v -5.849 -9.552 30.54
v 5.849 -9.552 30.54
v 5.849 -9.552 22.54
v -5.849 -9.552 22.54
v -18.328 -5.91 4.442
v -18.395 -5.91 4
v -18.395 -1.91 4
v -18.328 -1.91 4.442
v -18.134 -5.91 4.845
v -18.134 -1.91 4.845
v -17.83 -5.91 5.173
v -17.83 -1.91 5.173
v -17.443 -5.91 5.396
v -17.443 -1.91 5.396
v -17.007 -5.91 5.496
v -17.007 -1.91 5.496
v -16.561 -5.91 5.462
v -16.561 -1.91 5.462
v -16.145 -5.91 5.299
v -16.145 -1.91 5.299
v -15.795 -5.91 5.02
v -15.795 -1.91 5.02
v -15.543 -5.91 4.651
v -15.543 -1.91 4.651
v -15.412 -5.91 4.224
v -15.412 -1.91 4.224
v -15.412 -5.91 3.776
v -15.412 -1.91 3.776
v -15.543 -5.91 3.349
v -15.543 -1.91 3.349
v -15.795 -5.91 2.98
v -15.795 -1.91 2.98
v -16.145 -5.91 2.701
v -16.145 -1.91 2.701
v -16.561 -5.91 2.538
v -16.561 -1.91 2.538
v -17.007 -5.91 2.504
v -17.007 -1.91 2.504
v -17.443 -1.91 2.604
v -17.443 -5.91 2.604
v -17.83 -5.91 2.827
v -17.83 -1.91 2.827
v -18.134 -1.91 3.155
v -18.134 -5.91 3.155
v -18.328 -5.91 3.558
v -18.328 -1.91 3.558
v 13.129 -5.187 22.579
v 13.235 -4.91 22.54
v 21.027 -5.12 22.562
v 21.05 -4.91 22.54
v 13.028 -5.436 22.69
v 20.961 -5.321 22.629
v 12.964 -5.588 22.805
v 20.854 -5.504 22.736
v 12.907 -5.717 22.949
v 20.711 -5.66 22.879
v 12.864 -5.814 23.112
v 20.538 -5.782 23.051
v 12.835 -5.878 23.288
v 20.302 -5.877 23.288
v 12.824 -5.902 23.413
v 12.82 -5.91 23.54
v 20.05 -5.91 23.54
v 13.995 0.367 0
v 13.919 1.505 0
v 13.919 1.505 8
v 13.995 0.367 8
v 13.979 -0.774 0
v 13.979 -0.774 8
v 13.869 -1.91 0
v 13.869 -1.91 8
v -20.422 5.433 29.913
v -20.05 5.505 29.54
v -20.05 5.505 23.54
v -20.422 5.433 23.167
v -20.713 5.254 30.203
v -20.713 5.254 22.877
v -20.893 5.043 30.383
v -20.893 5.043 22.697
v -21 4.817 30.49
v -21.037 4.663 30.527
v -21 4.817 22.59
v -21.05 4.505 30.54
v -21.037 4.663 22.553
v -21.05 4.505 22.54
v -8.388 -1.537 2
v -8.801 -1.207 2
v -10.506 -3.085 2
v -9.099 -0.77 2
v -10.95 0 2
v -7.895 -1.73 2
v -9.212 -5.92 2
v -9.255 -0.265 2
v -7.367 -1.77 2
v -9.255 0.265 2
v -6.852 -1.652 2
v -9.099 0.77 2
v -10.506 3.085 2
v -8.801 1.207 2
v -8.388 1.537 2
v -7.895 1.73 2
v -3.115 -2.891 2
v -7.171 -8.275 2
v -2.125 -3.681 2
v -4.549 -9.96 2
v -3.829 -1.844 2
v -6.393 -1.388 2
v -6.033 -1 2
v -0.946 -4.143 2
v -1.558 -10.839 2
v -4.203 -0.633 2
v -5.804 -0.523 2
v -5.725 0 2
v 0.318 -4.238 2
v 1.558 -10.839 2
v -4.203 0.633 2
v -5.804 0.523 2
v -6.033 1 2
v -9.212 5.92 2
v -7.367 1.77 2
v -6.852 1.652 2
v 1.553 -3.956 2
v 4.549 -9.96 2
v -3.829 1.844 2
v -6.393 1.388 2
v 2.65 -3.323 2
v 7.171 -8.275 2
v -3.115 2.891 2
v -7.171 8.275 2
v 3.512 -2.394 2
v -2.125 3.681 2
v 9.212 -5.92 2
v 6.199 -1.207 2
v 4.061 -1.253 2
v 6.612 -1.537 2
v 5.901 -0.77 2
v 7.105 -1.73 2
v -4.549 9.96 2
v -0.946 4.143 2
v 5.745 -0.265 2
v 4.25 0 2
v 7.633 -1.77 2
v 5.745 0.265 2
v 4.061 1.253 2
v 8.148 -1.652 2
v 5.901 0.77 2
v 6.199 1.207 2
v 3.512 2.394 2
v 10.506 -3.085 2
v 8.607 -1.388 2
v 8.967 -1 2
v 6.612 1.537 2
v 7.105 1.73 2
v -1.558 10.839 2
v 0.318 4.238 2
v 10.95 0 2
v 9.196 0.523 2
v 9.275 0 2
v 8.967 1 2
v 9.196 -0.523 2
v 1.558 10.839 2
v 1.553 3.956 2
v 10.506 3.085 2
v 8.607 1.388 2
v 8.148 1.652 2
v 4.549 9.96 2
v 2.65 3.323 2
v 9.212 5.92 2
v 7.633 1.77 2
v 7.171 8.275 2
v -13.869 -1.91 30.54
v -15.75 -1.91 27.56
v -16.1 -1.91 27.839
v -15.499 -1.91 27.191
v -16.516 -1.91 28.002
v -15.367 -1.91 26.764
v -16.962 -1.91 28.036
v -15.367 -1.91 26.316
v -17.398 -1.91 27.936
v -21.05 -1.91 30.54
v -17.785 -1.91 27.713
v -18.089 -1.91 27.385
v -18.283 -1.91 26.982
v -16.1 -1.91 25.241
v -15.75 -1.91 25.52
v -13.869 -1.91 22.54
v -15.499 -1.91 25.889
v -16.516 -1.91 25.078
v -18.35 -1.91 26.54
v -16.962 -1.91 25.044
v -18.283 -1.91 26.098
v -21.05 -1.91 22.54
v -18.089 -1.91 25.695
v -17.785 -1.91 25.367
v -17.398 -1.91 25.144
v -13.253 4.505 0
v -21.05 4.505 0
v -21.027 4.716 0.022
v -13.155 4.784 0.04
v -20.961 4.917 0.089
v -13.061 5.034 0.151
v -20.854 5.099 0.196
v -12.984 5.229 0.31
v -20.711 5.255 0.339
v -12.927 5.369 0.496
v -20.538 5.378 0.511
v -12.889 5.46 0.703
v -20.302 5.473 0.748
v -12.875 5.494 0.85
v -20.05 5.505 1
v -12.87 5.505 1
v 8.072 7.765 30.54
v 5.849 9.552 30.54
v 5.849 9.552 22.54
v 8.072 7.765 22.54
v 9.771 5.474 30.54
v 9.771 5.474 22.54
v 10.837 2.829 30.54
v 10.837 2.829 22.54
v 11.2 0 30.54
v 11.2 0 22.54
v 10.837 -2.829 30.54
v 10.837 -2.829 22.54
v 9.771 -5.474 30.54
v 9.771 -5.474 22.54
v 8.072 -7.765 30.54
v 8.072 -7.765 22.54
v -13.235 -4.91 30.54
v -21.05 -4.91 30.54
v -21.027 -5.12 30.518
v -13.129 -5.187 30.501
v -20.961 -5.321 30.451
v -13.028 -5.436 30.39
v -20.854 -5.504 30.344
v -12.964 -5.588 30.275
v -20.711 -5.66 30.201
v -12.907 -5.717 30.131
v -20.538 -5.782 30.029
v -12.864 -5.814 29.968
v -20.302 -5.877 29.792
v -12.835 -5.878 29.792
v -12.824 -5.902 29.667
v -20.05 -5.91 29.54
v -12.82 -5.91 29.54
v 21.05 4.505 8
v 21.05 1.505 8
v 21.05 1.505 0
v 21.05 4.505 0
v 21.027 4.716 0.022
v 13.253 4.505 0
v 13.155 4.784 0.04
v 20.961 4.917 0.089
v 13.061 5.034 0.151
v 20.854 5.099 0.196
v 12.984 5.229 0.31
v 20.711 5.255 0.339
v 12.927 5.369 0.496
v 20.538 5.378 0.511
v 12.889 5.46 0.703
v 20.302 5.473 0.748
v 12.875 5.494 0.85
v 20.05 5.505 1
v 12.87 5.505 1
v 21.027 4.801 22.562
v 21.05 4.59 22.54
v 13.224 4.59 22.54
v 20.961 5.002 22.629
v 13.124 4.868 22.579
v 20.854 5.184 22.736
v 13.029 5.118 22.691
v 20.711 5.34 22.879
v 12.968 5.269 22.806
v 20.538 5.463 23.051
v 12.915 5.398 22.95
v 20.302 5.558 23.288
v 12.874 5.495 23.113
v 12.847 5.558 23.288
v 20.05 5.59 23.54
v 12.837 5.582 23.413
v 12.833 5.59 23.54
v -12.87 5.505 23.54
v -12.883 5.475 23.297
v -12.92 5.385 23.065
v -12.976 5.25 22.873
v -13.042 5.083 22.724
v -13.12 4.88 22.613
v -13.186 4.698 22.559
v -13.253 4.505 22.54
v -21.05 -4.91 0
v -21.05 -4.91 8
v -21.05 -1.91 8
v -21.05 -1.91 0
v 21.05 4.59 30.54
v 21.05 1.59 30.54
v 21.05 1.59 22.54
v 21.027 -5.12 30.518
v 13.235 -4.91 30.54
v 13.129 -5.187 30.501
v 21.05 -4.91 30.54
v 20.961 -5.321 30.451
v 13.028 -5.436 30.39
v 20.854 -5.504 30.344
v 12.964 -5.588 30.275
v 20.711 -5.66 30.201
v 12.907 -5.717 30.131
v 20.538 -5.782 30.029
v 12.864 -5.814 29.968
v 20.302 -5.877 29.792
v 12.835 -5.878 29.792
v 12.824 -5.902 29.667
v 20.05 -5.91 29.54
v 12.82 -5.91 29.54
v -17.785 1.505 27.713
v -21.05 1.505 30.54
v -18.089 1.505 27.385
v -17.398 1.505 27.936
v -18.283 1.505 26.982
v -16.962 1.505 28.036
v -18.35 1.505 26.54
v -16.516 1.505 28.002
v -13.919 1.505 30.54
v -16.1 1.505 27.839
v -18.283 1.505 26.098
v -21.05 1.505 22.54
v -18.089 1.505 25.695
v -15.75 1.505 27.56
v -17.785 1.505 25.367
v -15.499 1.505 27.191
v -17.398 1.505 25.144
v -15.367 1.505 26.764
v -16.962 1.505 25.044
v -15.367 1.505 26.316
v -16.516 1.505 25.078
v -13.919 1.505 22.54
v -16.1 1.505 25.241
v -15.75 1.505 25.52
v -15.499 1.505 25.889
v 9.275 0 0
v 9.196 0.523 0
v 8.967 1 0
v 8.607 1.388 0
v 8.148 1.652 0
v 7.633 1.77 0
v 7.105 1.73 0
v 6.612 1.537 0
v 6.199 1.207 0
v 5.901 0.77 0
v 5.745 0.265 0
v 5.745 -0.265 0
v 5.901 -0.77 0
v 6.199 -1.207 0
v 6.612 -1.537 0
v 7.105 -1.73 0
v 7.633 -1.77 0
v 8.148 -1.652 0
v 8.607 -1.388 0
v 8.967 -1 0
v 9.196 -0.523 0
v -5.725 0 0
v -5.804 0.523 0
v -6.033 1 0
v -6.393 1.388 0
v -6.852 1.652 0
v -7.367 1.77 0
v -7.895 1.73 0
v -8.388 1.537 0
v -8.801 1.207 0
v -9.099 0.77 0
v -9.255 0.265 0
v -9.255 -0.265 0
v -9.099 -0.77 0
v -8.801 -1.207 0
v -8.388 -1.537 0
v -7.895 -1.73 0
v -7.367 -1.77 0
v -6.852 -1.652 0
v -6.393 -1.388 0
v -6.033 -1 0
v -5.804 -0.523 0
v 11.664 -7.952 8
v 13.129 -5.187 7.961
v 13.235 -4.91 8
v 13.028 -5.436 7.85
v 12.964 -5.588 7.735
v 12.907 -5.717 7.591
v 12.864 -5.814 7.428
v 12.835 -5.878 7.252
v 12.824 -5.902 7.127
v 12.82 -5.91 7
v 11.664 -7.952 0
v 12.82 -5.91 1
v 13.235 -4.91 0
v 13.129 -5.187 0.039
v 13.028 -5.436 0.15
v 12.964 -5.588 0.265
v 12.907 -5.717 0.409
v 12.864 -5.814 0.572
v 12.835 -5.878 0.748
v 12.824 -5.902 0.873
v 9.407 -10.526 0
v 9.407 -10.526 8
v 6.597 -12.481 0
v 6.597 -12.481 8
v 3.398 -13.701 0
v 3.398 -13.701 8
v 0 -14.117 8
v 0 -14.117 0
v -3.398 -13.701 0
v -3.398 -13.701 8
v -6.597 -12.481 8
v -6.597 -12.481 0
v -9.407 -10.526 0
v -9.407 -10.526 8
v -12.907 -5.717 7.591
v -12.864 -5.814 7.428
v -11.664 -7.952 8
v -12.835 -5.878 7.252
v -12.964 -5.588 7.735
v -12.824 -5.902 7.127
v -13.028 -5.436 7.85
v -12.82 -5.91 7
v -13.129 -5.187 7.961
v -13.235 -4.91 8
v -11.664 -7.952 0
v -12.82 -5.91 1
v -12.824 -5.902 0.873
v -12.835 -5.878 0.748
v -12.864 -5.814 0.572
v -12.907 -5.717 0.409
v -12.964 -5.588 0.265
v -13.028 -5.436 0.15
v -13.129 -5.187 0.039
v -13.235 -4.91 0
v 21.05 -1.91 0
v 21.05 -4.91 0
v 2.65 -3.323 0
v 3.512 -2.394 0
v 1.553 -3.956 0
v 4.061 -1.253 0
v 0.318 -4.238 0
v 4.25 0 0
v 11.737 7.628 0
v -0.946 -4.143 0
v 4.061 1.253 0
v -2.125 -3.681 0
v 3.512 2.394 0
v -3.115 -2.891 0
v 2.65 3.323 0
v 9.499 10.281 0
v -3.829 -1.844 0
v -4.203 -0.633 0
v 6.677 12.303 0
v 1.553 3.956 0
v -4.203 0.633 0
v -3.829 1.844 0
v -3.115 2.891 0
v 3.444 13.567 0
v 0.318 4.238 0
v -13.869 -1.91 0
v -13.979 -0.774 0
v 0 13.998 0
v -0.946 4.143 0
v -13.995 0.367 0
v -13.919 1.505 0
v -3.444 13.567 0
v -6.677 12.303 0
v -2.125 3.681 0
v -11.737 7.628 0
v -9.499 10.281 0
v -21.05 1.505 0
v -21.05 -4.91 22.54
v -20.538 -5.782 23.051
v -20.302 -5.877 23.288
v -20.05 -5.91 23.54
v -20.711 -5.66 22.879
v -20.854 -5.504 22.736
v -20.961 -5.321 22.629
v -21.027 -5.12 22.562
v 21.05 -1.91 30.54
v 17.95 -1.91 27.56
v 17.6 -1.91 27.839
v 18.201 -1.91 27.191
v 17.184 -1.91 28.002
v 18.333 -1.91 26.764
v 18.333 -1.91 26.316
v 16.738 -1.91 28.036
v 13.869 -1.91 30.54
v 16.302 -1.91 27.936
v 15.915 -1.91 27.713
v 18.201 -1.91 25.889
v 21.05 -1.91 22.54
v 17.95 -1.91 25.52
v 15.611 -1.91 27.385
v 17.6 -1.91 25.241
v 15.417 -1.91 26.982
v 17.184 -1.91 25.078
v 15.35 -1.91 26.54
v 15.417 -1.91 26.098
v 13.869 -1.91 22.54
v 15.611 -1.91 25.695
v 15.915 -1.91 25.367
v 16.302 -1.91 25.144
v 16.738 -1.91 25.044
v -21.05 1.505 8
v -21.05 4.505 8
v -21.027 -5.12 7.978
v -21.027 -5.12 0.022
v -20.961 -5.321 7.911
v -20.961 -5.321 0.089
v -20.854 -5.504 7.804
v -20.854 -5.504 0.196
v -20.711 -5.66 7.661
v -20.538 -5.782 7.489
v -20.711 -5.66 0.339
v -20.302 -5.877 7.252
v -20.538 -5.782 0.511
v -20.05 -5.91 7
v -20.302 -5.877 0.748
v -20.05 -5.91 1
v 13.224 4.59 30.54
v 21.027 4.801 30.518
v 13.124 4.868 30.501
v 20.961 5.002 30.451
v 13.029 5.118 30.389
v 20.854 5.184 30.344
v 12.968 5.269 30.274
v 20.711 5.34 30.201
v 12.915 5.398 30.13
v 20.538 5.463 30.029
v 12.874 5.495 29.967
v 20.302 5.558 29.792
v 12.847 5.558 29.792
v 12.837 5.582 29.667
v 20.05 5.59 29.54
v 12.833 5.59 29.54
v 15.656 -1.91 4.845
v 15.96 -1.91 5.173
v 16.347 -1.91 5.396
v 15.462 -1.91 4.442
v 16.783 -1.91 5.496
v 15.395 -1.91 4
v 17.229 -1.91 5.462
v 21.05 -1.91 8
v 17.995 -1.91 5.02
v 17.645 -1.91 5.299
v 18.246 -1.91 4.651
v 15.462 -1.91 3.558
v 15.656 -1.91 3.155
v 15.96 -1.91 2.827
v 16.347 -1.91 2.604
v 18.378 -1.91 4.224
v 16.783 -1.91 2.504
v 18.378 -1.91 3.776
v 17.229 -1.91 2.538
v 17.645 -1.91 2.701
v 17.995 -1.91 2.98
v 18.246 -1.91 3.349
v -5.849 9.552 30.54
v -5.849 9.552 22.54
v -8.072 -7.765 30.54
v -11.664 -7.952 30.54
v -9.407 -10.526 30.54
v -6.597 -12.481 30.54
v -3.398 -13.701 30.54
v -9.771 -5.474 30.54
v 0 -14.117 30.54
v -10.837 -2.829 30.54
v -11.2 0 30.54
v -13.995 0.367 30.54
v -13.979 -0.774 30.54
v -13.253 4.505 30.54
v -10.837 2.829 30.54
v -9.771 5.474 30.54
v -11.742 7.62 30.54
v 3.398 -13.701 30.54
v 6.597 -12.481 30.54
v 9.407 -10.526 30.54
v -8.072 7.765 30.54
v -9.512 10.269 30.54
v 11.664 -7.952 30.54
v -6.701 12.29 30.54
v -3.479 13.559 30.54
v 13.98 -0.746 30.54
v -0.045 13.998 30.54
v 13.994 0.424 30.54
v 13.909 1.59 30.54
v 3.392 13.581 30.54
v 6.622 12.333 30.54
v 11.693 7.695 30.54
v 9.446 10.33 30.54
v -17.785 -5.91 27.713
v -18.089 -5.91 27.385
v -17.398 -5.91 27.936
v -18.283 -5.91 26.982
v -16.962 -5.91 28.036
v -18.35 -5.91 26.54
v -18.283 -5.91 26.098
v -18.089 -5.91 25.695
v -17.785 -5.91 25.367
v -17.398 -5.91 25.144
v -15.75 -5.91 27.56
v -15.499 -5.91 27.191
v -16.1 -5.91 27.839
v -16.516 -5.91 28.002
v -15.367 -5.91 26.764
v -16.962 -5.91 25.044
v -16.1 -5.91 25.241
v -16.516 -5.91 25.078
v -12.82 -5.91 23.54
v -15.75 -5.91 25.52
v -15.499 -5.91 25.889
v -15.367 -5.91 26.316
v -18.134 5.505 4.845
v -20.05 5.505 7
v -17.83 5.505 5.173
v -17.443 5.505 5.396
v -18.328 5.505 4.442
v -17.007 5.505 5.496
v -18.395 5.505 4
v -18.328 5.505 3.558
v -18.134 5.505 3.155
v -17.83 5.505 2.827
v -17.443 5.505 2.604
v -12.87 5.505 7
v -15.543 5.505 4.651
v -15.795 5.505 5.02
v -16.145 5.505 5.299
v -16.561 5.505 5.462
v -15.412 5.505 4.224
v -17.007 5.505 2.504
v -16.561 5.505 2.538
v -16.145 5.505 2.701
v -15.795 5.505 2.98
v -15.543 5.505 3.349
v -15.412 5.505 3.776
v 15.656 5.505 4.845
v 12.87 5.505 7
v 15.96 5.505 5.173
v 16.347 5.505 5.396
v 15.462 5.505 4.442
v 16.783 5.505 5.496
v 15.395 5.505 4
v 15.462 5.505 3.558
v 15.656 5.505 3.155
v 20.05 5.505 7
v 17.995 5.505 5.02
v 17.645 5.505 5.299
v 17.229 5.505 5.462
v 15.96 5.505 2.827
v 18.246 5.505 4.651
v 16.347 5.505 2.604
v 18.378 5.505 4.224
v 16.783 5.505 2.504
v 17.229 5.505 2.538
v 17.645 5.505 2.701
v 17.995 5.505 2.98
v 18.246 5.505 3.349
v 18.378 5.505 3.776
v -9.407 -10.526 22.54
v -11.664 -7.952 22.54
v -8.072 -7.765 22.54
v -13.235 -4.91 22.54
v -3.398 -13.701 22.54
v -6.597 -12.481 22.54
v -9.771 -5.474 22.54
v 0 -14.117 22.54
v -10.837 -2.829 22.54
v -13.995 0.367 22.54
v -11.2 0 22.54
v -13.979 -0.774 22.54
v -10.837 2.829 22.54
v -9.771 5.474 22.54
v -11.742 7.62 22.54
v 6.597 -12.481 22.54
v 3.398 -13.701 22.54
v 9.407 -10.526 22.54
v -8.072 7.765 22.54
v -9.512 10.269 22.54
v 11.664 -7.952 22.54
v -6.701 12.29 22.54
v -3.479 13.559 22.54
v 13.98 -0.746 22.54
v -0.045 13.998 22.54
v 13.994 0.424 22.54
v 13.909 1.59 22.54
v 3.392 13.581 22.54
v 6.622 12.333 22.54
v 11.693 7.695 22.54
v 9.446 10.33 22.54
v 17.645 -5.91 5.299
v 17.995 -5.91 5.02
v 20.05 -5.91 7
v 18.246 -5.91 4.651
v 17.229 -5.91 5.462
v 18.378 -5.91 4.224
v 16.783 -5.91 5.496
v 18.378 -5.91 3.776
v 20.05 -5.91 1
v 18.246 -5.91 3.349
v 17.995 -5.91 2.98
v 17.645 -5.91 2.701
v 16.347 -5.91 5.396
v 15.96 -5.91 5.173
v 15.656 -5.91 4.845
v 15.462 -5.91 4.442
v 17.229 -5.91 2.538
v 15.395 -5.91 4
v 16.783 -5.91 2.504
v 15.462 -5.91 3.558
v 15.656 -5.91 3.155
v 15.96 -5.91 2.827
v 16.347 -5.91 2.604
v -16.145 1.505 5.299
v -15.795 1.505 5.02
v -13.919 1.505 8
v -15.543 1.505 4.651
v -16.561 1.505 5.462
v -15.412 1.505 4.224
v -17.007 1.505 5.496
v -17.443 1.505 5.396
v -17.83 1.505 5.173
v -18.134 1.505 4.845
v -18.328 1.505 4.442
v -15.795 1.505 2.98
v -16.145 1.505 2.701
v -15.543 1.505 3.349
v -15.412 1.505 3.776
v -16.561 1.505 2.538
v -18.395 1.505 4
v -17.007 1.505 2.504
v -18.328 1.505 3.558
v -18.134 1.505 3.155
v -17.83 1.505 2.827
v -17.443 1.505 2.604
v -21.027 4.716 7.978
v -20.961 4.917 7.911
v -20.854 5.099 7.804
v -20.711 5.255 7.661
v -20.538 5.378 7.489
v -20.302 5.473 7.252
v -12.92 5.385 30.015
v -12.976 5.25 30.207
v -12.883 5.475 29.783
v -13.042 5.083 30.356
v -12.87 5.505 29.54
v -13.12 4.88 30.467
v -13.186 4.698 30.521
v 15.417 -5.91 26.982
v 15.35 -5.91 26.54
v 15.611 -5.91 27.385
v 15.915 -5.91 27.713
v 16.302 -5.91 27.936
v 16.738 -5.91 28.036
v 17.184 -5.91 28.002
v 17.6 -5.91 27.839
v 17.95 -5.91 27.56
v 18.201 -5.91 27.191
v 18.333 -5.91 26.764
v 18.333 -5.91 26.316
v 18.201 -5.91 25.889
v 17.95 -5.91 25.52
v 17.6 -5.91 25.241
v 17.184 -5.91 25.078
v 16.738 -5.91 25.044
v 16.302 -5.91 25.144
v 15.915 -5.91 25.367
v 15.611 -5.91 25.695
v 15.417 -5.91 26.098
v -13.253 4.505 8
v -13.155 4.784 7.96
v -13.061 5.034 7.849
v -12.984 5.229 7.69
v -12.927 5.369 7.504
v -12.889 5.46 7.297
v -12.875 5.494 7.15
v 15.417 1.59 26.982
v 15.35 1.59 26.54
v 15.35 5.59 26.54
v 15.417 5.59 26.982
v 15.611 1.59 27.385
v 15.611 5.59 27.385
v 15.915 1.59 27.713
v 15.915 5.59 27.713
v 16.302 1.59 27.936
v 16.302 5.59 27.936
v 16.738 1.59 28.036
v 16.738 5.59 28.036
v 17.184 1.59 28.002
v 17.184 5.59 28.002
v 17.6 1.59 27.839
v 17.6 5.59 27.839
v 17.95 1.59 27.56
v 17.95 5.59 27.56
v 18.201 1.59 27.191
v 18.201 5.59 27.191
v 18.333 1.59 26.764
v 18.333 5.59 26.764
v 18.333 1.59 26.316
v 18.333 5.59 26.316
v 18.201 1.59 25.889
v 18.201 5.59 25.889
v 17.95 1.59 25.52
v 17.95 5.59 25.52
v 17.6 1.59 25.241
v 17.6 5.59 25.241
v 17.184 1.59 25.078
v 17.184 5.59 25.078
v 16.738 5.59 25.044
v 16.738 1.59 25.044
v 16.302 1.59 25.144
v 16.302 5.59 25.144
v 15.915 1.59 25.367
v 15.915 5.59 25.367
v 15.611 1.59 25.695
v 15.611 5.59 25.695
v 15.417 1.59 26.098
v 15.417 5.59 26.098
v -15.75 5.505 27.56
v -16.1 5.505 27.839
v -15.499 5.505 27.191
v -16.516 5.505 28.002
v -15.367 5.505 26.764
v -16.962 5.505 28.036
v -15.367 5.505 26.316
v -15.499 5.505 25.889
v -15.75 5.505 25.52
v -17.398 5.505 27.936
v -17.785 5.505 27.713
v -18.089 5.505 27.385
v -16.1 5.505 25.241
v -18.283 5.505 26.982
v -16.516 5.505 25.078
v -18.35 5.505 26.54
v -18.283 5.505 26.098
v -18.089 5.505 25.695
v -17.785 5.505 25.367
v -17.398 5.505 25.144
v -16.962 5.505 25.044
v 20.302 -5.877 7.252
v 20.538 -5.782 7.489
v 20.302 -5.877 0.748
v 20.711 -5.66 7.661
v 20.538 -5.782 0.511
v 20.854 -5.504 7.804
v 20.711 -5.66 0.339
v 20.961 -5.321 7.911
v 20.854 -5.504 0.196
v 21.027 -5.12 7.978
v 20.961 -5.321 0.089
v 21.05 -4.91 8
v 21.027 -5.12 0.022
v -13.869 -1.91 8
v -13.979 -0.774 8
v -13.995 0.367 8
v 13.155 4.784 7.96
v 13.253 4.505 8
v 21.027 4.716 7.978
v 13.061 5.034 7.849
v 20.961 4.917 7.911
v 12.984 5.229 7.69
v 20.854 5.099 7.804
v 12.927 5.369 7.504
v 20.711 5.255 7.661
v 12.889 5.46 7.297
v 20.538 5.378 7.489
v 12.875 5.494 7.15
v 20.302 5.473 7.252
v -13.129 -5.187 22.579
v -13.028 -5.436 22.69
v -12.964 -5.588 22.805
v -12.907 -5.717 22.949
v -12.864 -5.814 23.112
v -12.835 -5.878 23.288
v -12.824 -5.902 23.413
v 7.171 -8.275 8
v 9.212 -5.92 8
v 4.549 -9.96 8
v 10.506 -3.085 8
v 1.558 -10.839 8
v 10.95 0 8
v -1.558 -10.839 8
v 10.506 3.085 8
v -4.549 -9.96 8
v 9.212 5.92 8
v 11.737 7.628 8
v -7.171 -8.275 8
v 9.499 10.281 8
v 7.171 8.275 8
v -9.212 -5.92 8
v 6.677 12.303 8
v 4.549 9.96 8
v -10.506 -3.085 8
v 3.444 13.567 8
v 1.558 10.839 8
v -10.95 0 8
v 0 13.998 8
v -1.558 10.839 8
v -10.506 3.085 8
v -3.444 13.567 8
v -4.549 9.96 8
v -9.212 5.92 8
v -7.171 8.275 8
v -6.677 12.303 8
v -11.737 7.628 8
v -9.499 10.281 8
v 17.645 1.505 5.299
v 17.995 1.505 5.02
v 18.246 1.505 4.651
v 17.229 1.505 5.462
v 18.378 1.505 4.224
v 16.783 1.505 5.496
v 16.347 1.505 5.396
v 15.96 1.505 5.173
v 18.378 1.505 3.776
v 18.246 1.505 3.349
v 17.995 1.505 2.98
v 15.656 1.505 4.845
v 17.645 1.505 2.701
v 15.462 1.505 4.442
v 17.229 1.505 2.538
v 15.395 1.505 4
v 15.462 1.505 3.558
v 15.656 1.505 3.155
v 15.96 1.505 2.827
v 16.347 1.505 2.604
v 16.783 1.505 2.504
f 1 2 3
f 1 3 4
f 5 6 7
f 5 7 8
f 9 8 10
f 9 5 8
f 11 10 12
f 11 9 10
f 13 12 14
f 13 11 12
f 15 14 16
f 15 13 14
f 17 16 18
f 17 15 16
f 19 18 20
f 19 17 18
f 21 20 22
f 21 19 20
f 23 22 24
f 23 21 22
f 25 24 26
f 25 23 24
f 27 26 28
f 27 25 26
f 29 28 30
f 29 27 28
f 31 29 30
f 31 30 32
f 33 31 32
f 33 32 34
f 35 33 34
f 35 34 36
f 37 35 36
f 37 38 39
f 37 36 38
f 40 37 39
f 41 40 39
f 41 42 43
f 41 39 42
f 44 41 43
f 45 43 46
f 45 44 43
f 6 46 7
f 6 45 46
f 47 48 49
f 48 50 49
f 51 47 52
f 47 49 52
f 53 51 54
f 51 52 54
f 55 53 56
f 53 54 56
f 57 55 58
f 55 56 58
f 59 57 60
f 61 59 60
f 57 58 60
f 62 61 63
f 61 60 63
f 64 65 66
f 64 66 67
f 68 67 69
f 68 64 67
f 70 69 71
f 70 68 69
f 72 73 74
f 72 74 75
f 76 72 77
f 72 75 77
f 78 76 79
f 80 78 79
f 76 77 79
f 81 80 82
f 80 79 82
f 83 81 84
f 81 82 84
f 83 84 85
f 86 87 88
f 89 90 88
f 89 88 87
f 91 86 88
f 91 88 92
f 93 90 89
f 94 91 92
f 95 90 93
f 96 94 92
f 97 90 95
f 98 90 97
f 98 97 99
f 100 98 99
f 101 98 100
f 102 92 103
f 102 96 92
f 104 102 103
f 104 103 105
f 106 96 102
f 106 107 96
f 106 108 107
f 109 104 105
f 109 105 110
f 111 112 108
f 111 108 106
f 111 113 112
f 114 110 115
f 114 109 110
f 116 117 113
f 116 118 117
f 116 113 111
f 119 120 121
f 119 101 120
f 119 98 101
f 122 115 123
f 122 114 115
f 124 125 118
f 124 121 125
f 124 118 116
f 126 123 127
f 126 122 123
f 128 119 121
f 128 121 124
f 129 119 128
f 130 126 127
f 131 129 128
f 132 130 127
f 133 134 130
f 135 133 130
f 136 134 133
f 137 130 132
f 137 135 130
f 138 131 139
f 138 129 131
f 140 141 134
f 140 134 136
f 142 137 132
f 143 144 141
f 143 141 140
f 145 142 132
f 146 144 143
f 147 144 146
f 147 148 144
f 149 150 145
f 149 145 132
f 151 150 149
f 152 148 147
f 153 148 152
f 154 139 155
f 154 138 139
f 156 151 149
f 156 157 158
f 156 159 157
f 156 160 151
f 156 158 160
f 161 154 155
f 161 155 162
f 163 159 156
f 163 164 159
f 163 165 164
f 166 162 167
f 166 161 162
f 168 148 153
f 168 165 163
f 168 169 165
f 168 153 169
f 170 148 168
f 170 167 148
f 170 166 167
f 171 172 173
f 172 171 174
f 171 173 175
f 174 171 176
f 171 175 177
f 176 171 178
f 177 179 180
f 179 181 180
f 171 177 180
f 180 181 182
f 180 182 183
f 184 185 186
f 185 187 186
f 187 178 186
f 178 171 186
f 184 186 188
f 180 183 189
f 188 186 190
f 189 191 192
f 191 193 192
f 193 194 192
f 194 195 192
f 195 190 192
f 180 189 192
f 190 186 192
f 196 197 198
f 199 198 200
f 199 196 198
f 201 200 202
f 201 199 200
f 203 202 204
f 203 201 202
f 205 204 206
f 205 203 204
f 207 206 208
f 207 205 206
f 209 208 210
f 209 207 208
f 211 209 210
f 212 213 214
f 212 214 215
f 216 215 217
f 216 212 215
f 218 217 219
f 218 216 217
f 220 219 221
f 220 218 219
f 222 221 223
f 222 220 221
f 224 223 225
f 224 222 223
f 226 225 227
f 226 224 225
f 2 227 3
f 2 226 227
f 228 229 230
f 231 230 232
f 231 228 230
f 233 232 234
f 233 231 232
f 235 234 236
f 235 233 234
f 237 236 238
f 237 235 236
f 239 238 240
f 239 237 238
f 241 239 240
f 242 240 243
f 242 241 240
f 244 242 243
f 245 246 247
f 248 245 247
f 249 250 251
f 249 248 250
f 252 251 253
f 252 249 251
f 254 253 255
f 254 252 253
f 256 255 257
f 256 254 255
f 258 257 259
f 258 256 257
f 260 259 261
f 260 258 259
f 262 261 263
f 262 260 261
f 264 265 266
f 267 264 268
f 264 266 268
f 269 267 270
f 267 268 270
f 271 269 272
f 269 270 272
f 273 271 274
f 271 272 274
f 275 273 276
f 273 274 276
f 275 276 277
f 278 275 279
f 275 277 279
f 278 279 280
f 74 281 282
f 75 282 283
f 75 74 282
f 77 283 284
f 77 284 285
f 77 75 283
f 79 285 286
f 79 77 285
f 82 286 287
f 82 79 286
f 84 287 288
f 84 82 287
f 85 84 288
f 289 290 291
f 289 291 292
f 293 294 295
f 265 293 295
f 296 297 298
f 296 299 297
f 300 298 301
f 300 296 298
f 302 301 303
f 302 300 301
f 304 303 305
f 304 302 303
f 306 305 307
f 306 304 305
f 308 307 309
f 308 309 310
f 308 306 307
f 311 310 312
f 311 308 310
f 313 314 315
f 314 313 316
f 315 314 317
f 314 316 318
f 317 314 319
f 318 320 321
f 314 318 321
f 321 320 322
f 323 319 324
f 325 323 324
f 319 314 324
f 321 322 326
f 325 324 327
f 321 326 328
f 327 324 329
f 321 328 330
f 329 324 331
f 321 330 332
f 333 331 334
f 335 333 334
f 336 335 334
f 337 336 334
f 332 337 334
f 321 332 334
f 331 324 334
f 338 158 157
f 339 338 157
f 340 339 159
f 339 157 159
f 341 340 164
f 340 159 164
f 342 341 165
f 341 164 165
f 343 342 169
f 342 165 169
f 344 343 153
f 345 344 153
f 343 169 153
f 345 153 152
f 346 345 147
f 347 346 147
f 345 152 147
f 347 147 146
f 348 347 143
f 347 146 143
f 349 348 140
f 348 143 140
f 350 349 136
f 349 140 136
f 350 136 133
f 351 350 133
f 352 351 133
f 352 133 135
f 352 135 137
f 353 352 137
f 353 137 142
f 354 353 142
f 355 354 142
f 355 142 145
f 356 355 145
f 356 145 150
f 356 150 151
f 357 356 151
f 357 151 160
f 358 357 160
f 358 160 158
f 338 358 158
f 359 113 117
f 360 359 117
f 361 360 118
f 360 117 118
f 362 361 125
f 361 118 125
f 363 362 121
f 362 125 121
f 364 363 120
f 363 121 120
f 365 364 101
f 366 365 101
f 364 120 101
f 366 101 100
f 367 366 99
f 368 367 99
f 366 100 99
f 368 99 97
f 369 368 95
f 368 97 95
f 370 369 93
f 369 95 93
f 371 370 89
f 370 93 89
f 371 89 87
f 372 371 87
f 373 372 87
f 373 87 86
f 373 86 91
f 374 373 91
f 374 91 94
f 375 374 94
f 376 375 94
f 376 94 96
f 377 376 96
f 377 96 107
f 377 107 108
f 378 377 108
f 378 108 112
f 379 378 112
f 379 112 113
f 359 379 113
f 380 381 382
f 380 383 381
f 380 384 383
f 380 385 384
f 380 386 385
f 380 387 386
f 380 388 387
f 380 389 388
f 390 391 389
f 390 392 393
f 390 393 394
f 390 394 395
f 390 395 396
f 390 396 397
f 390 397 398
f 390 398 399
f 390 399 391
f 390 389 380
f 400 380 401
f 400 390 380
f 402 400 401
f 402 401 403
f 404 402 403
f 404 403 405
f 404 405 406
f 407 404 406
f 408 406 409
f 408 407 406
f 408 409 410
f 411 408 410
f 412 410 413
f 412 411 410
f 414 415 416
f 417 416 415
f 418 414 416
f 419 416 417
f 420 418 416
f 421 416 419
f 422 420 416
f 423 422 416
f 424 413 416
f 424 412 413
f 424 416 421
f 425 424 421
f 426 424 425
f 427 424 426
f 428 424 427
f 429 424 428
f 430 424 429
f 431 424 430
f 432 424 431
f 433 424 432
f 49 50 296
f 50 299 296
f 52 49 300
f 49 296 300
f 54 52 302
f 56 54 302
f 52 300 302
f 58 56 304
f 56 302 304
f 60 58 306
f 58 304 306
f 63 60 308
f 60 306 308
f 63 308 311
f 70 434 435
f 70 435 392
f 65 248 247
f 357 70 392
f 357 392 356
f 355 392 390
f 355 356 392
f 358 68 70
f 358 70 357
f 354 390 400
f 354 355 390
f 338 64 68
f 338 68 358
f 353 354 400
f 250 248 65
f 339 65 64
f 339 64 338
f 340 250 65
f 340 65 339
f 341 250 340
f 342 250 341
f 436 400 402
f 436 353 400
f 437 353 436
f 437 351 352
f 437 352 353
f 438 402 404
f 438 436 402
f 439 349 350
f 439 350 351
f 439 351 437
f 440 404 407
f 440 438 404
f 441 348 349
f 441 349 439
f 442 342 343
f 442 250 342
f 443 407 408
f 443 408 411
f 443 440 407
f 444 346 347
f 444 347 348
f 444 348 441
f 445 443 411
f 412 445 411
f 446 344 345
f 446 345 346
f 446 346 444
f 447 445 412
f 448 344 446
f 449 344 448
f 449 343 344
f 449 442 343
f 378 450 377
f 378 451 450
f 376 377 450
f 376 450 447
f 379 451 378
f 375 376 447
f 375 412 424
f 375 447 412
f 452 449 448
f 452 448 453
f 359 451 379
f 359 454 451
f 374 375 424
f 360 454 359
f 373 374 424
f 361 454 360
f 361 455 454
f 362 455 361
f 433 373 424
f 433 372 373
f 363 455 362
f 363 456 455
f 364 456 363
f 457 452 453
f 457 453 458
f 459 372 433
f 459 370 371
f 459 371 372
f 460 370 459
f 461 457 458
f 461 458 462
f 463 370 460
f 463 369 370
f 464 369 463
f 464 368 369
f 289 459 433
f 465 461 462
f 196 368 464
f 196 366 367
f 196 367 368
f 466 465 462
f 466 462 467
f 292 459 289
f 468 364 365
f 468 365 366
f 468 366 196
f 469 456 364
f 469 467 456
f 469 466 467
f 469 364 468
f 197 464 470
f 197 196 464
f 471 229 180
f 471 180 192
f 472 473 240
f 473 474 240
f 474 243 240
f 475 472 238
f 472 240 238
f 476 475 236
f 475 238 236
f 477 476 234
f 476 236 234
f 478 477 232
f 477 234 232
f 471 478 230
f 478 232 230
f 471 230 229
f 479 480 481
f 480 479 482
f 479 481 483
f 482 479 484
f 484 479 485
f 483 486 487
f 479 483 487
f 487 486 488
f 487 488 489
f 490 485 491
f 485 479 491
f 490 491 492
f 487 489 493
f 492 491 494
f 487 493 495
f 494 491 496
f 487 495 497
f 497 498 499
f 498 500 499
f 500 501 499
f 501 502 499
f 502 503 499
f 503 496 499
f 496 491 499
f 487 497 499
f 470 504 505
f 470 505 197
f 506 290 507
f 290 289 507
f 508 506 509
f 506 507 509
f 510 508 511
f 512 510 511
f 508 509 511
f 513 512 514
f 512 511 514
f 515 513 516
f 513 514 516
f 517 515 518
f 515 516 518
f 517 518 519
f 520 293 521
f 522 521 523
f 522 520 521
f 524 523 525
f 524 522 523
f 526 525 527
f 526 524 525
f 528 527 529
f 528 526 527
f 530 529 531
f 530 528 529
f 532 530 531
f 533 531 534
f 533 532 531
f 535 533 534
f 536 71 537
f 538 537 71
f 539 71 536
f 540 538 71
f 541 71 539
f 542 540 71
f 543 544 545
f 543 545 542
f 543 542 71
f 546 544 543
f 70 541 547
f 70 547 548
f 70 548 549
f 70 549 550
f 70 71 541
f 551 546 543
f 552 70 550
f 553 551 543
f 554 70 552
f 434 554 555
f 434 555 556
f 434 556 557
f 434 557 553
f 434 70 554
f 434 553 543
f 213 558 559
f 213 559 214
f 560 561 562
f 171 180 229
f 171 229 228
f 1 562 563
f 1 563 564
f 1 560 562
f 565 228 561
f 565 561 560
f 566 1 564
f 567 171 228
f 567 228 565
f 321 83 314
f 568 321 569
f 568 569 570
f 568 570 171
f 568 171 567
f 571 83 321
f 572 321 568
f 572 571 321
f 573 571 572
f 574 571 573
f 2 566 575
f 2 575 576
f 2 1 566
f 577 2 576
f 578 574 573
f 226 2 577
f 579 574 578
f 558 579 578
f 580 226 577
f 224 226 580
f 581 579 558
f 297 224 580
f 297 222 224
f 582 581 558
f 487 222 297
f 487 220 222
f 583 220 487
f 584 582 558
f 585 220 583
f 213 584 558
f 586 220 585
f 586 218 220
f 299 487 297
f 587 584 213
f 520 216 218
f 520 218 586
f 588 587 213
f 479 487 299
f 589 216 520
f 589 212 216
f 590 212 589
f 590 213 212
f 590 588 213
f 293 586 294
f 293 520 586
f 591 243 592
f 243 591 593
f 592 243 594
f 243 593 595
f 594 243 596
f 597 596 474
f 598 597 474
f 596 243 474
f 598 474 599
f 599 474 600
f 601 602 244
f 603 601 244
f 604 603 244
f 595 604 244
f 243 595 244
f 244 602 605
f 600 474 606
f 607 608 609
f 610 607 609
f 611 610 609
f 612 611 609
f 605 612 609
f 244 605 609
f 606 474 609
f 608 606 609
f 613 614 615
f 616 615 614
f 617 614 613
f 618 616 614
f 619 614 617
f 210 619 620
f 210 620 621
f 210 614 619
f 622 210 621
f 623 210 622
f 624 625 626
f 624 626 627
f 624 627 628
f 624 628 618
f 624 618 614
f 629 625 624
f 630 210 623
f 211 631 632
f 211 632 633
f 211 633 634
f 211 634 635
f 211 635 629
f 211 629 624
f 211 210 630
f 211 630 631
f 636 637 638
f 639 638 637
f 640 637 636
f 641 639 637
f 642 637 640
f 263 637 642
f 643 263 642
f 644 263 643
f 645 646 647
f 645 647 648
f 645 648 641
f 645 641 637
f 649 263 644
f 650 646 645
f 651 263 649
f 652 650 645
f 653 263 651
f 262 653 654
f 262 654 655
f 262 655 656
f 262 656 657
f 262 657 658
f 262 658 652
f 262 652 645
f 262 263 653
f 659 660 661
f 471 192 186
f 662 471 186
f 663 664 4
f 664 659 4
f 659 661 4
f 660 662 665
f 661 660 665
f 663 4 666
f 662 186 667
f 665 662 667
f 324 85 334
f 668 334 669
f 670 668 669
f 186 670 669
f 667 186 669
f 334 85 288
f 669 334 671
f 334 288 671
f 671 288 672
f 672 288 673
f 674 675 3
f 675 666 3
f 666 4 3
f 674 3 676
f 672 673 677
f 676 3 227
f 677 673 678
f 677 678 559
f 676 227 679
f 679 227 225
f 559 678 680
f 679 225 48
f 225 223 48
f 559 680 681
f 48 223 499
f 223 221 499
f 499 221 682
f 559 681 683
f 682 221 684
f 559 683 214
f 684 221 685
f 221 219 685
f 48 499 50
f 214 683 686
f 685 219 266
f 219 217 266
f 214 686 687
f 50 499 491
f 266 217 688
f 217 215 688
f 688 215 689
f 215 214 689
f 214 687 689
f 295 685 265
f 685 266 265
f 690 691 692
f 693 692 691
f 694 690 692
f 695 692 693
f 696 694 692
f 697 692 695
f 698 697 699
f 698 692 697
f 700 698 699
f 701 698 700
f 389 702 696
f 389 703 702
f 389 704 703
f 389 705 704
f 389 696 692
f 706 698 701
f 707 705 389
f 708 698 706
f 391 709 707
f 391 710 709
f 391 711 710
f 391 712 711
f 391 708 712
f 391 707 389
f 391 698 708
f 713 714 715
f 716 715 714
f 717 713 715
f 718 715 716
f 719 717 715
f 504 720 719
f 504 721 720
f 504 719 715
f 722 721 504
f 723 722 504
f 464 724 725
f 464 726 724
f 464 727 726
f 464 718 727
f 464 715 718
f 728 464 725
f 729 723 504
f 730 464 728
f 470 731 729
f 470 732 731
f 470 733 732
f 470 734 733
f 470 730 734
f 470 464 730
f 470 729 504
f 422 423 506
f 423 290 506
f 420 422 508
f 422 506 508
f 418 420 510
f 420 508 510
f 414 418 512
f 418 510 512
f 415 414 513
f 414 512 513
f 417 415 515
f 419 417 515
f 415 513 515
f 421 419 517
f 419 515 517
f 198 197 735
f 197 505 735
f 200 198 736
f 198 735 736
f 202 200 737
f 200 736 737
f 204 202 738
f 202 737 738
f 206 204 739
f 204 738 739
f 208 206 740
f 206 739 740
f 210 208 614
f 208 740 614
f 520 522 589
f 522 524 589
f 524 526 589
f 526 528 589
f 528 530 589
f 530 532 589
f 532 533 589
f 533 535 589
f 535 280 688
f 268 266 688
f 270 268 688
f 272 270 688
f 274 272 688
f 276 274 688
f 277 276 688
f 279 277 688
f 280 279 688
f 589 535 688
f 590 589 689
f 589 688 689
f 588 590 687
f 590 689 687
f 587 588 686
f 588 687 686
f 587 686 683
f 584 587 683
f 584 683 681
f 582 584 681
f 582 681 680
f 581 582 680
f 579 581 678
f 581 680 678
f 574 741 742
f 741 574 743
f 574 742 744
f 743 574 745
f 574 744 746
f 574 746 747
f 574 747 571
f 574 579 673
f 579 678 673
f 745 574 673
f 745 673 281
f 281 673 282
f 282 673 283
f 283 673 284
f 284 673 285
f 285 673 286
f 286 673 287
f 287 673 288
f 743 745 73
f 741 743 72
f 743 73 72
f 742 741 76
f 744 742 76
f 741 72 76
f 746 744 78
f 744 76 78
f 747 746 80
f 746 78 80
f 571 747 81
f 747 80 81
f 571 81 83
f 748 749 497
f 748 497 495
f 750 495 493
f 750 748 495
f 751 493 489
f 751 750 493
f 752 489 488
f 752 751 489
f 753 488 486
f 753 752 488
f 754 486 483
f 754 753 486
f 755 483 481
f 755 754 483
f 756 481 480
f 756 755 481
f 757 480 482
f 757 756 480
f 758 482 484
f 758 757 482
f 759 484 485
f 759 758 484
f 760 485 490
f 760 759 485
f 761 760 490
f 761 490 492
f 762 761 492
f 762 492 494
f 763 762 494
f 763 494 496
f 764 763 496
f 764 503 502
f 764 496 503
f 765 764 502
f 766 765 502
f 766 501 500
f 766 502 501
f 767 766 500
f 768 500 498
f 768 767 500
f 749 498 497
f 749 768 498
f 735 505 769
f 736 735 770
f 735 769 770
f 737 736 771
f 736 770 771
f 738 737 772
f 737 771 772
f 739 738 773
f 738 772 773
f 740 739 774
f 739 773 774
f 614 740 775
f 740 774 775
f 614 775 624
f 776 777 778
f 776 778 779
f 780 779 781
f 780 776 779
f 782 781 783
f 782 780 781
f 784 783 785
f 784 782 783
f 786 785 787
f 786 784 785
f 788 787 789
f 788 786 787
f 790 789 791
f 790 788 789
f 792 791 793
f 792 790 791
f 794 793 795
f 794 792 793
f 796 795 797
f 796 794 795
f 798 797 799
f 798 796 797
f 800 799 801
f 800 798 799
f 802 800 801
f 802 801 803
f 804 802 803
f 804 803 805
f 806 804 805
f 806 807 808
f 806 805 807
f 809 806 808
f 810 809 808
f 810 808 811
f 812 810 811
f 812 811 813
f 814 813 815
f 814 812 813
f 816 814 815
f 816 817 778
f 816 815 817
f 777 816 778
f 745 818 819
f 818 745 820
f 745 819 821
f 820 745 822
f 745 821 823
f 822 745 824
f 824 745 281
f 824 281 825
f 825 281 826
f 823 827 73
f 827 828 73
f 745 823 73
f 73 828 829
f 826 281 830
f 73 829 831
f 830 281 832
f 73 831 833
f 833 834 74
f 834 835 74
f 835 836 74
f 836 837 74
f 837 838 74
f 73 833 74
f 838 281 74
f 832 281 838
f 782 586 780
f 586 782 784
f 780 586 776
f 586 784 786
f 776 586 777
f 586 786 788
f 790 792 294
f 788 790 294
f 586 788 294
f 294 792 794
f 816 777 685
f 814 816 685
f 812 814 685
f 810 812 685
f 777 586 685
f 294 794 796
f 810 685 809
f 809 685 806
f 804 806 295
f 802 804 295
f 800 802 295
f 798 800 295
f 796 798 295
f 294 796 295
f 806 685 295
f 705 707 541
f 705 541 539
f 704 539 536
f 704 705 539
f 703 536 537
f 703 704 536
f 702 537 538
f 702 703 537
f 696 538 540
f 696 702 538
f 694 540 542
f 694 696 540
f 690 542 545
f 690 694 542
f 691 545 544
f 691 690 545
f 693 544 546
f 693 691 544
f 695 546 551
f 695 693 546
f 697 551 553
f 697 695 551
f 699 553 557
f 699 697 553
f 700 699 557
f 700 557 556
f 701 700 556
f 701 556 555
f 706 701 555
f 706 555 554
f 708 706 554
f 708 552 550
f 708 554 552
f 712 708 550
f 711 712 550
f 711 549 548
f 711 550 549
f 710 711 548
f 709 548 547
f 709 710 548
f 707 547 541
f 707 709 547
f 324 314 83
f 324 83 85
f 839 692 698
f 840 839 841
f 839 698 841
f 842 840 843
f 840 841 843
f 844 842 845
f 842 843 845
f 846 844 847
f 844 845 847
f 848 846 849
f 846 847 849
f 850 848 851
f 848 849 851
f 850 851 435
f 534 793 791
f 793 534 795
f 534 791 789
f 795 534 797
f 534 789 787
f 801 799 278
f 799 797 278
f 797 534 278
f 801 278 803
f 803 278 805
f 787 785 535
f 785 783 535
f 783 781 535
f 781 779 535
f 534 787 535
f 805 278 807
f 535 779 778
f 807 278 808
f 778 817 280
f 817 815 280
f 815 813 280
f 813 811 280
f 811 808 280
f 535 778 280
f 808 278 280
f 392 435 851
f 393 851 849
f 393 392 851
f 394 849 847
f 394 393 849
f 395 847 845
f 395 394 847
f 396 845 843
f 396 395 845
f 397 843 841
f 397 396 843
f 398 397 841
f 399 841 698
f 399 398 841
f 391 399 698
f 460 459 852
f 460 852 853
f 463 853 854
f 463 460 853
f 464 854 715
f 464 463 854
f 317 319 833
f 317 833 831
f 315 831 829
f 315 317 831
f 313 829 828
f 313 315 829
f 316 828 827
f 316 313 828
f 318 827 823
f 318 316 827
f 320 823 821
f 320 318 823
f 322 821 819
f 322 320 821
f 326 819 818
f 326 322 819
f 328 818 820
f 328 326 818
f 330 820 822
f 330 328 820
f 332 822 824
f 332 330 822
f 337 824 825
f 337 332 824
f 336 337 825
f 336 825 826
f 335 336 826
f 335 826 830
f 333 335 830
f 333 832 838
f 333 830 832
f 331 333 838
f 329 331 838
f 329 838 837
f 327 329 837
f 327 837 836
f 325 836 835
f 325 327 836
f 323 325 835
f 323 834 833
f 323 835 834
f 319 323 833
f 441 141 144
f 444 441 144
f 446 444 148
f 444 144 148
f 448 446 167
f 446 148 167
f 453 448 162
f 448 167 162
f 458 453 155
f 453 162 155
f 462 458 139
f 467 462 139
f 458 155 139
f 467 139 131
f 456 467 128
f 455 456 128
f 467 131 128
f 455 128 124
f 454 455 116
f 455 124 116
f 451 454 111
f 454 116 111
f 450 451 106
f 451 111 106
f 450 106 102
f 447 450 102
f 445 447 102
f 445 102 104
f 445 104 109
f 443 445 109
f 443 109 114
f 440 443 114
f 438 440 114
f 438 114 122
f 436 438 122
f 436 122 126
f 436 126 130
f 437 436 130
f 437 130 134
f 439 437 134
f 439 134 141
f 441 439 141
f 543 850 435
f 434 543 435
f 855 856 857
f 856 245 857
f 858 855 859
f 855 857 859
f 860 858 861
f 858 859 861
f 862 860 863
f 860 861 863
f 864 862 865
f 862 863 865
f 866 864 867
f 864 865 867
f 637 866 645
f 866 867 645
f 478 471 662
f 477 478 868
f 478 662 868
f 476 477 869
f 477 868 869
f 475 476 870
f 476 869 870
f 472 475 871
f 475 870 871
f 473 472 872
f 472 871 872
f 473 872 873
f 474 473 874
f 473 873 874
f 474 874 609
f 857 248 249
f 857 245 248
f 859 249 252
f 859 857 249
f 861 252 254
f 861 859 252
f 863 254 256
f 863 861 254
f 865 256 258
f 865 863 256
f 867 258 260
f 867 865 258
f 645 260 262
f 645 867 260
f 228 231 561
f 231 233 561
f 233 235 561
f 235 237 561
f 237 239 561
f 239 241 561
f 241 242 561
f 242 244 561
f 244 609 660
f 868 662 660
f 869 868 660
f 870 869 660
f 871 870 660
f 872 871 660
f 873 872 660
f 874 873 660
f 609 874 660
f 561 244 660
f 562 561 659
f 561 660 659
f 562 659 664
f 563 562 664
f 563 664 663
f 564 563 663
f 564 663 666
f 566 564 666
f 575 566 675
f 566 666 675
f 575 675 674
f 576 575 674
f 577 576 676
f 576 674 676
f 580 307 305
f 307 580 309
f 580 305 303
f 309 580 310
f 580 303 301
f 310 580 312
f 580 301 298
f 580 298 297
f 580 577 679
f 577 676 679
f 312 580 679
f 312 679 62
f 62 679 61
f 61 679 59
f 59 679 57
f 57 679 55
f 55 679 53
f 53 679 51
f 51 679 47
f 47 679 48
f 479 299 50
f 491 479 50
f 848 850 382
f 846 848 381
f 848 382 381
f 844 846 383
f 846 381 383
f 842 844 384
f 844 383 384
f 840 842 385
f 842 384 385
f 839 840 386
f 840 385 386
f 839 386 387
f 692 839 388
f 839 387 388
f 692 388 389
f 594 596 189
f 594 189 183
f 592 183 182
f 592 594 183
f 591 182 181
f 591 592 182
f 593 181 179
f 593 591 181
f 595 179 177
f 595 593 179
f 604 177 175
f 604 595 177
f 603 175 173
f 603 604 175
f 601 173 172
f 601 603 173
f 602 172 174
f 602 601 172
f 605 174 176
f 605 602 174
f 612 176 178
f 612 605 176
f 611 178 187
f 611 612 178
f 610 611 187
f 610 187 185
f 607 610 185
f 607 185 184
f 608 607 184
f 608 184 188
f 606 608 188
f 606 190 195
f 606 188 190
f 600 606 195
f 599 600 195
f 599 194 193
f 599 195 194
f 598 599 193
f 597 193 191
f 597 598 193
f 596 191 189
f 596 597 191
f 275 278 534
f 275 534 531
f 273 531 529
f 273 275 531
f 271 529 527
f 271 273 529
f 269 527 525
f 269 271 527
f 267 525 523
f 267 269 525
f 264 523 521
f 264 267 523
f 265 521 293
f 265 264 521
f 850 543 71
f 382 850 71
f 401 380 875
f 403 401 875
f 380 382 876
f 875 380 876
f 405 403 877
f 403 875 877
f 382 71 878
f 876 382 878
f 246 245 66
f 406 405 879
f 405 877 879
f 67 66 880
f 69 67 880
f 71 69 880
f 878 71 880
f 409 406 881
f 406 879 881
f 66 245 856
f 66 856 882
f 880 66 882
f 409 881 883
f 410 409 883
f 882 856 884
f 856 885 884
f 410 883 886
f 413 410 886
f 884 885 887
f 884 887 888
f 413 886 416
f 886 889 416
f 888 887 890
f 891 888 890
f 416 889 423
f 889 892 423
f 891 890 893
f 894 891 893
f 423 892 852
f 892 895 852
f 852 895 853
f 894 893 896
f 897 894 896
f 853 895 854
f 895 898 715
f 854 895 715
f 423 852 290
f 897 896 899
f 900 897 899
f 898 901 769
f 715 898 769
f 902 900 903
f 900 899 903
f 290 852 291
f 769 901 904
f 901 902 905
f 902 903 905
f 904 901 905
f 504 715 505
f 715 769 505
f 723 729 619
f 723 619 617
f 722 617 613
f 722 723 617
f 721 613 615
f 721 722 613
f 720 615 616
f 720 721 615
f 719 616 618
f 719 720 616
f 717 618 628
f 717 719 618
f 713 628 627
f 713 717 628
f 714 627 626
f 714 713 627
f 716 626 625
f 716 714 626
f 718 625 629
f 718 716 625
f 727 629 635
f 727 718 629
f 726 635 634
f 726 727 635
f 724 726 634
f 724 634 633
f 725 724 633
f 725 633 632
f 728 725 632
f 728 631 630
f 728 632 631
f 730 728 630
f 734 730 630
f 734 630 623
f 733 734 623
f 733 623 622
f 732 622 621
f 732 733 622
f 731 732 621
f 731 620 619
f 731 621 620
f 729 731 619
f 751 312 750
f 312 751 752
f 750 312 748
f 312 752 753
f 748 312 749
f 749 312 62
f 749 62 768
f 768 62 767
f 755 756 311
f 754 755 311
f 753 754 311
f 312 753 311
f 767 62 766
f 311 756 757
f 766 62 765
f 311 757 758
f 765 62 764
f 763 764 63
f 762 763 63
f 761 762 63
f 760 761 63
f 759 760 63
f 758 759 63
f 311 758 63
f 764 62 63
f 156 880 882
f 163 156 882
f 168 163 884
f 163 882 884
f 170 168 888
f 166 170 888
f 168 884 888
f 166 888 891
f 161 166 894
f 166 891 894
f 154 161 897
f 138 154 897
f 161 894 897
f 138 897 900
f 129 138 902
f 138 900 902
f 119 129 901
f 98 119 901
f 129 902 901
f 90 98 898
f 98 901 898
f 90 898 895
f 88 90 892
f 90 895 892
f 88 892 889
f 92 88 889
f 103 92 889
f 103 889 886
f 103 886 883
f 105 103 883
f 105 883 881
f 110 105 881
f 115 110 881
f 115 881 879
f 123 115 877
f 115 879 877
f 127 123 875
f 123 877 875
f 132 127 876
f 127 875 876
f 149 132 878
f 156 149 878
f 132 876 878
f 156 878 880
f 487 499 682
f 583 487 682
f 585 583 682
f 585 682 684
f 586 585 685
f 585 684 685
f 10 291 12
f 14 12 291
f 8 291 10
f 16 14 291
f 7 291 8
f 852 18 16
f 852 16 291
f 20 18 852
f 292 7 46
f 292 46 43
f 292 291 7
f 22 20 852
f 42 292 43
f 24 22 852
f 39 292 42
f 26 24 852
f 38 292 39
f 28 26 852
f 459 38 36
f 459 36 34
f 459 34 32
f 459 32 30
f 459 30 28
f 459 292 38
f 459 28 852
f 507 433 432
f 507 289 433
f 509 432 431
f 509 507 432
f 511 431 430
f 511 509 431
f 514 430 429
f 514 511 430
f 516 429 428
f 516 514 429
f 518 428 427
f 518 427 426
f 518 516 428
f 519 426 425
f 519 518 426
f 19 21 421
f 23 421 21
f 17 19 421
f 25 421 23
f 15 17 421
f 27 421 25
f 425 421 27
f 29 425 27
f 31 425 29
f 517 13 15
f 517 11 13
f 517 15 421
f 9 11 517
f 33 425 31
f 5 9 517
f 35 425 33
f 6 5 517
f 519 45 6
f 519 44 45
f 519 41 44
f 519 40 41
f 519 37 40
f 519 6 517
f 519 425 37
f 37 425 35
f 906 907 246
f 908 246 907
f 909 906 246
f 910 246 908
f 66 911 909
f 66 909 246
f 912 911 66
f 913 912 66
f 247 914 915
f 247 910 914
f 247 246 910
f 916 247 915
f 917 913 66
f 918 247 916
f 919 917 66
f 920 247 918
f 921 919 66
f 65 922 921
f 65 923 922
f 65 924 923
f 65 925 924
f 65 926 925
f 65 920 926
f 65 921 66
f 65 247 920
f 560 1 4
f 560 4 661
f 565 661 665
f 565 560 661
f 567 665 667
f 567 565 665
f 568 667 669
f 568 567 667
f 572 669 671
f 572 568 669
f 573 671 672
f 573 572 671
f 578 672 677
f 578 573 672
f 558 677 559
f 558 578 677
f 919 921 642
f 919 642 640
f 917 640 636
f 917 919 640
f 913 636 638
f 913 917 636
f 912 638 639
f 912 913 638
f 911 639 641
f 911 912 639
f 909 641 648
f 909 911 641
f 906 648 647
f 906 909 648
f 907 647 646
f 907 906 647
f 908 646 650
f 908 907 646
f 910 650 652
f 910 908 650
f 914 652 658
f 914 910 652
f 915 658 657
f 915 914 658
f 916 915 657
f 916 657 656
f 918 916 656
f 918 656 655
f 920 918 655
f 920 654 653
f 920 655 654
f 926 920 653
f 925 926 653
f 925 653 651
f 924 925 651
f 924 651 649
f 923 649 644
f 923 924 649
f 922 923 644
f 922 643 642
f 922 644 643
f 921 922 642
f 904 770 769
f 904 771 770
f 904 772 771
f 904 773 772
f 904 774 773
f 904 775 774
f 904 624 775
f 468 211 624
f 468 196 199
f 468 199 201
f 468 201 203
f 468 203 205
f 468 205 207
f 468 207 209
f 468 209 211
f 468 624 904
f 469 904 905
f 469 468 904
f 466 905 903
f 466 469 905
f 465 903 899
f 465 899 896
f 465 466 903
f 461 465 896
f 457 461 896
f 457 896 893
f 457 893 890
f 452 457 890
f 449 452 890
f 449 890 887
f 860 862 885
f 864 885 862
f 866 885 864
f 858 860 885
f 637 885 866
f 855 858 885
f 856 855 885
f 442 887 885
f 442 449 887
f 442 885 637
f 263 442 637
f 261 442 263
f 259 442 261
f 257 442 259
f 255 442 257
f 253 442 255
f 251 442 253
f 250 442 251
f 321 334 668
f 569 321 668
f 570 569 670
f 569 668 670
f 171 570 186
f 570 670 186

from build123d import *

# Parameters (mm, degrees)
SALIENTE_EXTRUIR1_DEPTH     = 8
CROQUIS2_R                  = 10.95
CORTAR_EXTRUIR1_DEPTH       = 6
CROQUIS3_R                  = 4.25
CROQUIS3_R_2                = 1.775
CORTAR_EXTRUIR2_DEPTH       = 3.5
SALIENTE_EXTRUIR3_DEPTH     = 8
CORTAR_EXTRUIR8_DEPTH       = 10
CORTAR_EXTRUIR9_DEPTH       = 44.54426019
CORTAR_EXTRUIR9_DEPTH_BACK  = 44.54426019
CROQUIS11_W                 = 3
CROQUIS11_H                 = 30.54
CORTAR_EXTRUIR10_DEPTH      = 42.961939121
CORTAR_EXTRUIR10_DEPTH_BACK = 42.961939121
CROQUIS8_R                  = 1.5
REDONDEO1_R                 = 1
REDONDEO2_R                 = 1


with BuildPart() as part:
    # Croquis1 → Saliente-Extruir1 (new body)
    with BuildSketch(Plane.XY):
        with BuildLine():
            Line((-13.918830485, 1.505376344), (-24.049710109, 1.505376344))
            Line((-24.049710109, 1.505376344), (-24.049710109, 5.505376344))
            Line((-24.049710109, 5.505376344), (-12.869714009, 5.505376344))
            ThreePointArc((-12.869714009, 5.505376344), (0, 13.997810806), (12.869714009, 5.505376344))
            Line((12.869714009, 5.505376344), (24.049710109, 5.505376344))
            Line((24.049710109, 5.505376344), (24.014276756, 1.505376344))
            Line((24.014276756, 1.505376344), (13.918830485, 1.505376344))
            ThreePointArc((13.918830485, 1.505376344), (13.998517204, -0.203754945), (13.869120376, -1.909842925))
            Line((13.869120376, -1.909842925), (24, -1.909842925))
            Line((24, -1.909842925), (24, -5.909842925))
            Line((24, -5.909842925), (12.8200039, -5.909842925))
            ThreePointArc((12.8200039, -5.909842925), (0, -14.11661232), (-12.8200039, -5.909842925))
            Line((-12.8200039, -5.909842925), (-24, -5.909842925))
            Line((-24, -5.909842925), (-24, -1.909842925))
            Line((-24, -1.909842925), (-13.869120376, -1.909842925))
            ThreePointArc((-13.869120376, -1.909842925), (-13.998517204, -0.203754945), (-13.918830485, 1.505376344))
        make_face()
    extrude(amount=SALIENTE_EXTRUIR1_DEPTH)

    # Croquis2 → Cortar-Extruir1 (cut)
    with BuildSketch(Plane.XY.offset(8)):
        Circle(CROQUIS2_R)
    extrude(amount=-CORTAR_EXTRUIR1_DEPTH, mode=Mode.SUBTRACT)

    # Croquis3 → Cortar-Extruir2 (cut)
    with BuildSketch(Plane.XY.offset(2)):
        Circle(CROQUIS3_R)
        with Locations((-7.5, 0)):
            Circle(CROQUIS3_R_2)
        with Locations((7.5, 0)):
            Circle(CROQUIS3_R_2)
    extrude(amount=-CORTAR_EXTRUIR2_DEPTH, mode=Mode.SUBTRACT)


with BuildPart() as body_2:
    # Croquis6 → Saliente-Extruir3 (new body)
    with BuildSketch(Plane.XY.offset(22.54)):
        with BuildLine():
            Line((-12.869714009, 5.505376344), (-24, 5.505376344))
            Line((-24, 5.505376344), (-24, 1.505376344))
            Line((-24, 1.505376344), (-13.918830485, 1.505376344))
            ThreePointArc((-13.918830485, 1.505376344), (-13.998517204, -0.203754945), (-13.869120376, -1.909842925))
            Line((-13.869120376, -1.909842925), (-24, -1.909842925))
            Line((-24, -1.909842925), (-24, -5.909842925))
            Line((-24, -5.909842925), (-12.8200039, -5.909842925))
            ThreePointArc((-12.8200039, -5.909842925), (0, -14.11661232), (12.8200039, -5.909842925))
            Line((12.8200039, -5.909842925), (24, -5.909842925))
            Line((24, -5.909842925), (24, -1.909842925))
            Line((24, -1.909842925), (13.869120376, -1.909842925))
            ThreePointArc((13.869120376, -1.909842925), (13.999072992, -0.161106695), (13.909399717, 1.590157075))
            Line((13.909399717, 1.590157075), (24, 1.590157075))
            Line((24, 1.590157075), (24, 5.590157075))
            Line((24, 5.590157075), (12.833115415, 5.590157075))
            ThreePointArc((12.833115415, 5.590157075), (-0.046171499, 13.997734658), (-12.869714009, 5.505376344))
        make_face()
    extrude(amount=SALIENTE_EXTRUIR3_DEPTH)

    # Croquis7 → Cortar-Extruir8 (cut)
    with BuildSketch(Plane.XY.offset(30.54)):
        with BuildLine():
            Line((-5.848709946, 9.551575366), (5.848709946, 9.551575366))
            ThreePointArc((5.848709946, 9.551575366), (11.2, 0), (5.848709946, -9.551575366))
            Line((5.848709946, -9.551575366), (-5.848709946, -9.551575366))
            ThreePointArc((-5.848709946, -9.551575366), (-11.2, 0), (-5.848709946, 9.551575366))
        make_face()
    extrude(amount=-CORTAR_EXTRUIR8_DEPTH, mode=Mode.SUBTRACT)


with BuildPart() as cortar_extruir9_tool:
    # Croquis11 → Cortar-Extruir9 (new, two sides: drawn at the far end of the back side and taken through both)
    with BuildSketch(Plane(origin=(0, 5.505376344, 0), x_dir=(1, 0, 0), z_dir=(0, 1, 0)).offset(-CORTAR_EXTRUIR9_DEPTH_BACK)):
        with Locations((-22.549710109, -15.27)):
            Rectangle(CROQUIS11_W, CROQUIS11_H)
        with Locations((22.549710109, -15.27)):
            Rectangle(CROQUIS11_W, CROQUIS11_H)
    extrude(amount=CORTAR_EXTRUIR9_DEPTH + CORTAR_EXTRUIR9_DEPTH_BACK)


with BuildPart() as part_1:
    add(part.part)

    # Cortar-Extruir9: cut by cortar_extruir9_tool
    add(cortar_extruir9_tool.part, mode=Mode.SUBTRACT)


with BuildPart() as body_2_1:
    add(body_2.part)

    # Cortar-Extruir9: cut by cortar_extruir9_tool
    add(cortar_extruir9_tool.part, mode=Mode.SUBTRACT)


with BuildPart() as cortar_extruir10_tool:
    # Croquis8 → Cortar-Extruir10 (new, two sides: drawn at the far end of the back side and taken through both)
    with BuildSketch(Plane(origin=(0, 5.505376344, 0), x_dir=(1, 0, 0), z_dir=(0, 1, 0)).offset(-CORTAR_EXTRUIR10_DEPTH_BACK)):
        with Locations(Location((16.85, -26.54, 0), (0, 0, 180))):
            Circle(CROQUIS8_R)
        with Locations(Location((16.894937141, -4, 0), (0, 0, 180))):
            Circle(CROQUIS8_R)
        with Locations(Location((-16.894937141, -4, 0), (0, 0, 180))):
            Circle(CROQUIS8_R)
        with Locations(Location((-16.85, -26.54, 0), (0, 0, 180))):
            Circle(CROQUIS8_R)
    extrude(amount=CORTAR_EXTRUIR10_DEPTH + CORTAR_EXTRUIR10_DEPTH_BACK)


with BuildPart() as part_2:
    add(part_1.part)

    # Cortar-Extruir10: cut by cortar_extruir10_tool
    add(cortar_extruir10_tool.part, mode=Mode.SUBTRACT)

    # Redondeo1
    redondeo1_edges = [part_2.edges().sort_by_distance(p)[0] for p in [
        (16.934857005, -5.909842925, 0),
        (-16.959712059, 5.505376344, 0),
        (16.934857005, -5.909842925, 8),
        (16.959712059, 5.505376344, 0),
        (-16.934857005, -5.909842925, 0),
        (-16.959712059, 5.505376344, 8),
        (-16.934857005, -5.909842925, 8),
        (16.959712059, 5.505376344, 8),
        (-21.049710109, -5.909842925, 4),
        (-21.049710109, 5.505376344, 4),
        (21.049710109, 5.505376344, 4),
        (21.049710109, -5.909842925, 4),
    ]]
    fillet(redondeo1_edges, radius=REDONDEO1_R)


with BuildPart() as body_2_2:
    add(body_2_1.part)

    # Cortar-Extruir10: cut by cortar_extruir10_tool
    add(cortar_extruir10_tool.part, mode=Mode.SUBTRACT)

    # Redondeo2
    redondeo2_edges = [body_2_2.edges().sort_by_distance(p)[0] for p in [
        (16.934857005, -5.909842925, 22.54),
        (-16.959712059, 5.505376344, 22.54),
        (16.934857005, -5.909842925, 30.54),
        (16.941412762, 5.590157075, 22.54),
        (-16.934857005, -5.909842925, 22.54),
        (-16.959712059, 5.505376344, 30.54),
        (-16.934857005, -5.909842925, 30.54),
        (16.941412762, 5.590157075, 30.54),
        (-21.049710109, -5.909842925, 26.54),
        (-21.049710109, 5.505376344, 26.54),
        (21.049710109, 5.590157075, 26.54),
        (21.049710109, -5.909842925, 26.54),
    ]]
    fillet(redondeo2_edges, radius=REDONDEO2_R)


solid = Compound([part_2.part, body_2_2.part])
